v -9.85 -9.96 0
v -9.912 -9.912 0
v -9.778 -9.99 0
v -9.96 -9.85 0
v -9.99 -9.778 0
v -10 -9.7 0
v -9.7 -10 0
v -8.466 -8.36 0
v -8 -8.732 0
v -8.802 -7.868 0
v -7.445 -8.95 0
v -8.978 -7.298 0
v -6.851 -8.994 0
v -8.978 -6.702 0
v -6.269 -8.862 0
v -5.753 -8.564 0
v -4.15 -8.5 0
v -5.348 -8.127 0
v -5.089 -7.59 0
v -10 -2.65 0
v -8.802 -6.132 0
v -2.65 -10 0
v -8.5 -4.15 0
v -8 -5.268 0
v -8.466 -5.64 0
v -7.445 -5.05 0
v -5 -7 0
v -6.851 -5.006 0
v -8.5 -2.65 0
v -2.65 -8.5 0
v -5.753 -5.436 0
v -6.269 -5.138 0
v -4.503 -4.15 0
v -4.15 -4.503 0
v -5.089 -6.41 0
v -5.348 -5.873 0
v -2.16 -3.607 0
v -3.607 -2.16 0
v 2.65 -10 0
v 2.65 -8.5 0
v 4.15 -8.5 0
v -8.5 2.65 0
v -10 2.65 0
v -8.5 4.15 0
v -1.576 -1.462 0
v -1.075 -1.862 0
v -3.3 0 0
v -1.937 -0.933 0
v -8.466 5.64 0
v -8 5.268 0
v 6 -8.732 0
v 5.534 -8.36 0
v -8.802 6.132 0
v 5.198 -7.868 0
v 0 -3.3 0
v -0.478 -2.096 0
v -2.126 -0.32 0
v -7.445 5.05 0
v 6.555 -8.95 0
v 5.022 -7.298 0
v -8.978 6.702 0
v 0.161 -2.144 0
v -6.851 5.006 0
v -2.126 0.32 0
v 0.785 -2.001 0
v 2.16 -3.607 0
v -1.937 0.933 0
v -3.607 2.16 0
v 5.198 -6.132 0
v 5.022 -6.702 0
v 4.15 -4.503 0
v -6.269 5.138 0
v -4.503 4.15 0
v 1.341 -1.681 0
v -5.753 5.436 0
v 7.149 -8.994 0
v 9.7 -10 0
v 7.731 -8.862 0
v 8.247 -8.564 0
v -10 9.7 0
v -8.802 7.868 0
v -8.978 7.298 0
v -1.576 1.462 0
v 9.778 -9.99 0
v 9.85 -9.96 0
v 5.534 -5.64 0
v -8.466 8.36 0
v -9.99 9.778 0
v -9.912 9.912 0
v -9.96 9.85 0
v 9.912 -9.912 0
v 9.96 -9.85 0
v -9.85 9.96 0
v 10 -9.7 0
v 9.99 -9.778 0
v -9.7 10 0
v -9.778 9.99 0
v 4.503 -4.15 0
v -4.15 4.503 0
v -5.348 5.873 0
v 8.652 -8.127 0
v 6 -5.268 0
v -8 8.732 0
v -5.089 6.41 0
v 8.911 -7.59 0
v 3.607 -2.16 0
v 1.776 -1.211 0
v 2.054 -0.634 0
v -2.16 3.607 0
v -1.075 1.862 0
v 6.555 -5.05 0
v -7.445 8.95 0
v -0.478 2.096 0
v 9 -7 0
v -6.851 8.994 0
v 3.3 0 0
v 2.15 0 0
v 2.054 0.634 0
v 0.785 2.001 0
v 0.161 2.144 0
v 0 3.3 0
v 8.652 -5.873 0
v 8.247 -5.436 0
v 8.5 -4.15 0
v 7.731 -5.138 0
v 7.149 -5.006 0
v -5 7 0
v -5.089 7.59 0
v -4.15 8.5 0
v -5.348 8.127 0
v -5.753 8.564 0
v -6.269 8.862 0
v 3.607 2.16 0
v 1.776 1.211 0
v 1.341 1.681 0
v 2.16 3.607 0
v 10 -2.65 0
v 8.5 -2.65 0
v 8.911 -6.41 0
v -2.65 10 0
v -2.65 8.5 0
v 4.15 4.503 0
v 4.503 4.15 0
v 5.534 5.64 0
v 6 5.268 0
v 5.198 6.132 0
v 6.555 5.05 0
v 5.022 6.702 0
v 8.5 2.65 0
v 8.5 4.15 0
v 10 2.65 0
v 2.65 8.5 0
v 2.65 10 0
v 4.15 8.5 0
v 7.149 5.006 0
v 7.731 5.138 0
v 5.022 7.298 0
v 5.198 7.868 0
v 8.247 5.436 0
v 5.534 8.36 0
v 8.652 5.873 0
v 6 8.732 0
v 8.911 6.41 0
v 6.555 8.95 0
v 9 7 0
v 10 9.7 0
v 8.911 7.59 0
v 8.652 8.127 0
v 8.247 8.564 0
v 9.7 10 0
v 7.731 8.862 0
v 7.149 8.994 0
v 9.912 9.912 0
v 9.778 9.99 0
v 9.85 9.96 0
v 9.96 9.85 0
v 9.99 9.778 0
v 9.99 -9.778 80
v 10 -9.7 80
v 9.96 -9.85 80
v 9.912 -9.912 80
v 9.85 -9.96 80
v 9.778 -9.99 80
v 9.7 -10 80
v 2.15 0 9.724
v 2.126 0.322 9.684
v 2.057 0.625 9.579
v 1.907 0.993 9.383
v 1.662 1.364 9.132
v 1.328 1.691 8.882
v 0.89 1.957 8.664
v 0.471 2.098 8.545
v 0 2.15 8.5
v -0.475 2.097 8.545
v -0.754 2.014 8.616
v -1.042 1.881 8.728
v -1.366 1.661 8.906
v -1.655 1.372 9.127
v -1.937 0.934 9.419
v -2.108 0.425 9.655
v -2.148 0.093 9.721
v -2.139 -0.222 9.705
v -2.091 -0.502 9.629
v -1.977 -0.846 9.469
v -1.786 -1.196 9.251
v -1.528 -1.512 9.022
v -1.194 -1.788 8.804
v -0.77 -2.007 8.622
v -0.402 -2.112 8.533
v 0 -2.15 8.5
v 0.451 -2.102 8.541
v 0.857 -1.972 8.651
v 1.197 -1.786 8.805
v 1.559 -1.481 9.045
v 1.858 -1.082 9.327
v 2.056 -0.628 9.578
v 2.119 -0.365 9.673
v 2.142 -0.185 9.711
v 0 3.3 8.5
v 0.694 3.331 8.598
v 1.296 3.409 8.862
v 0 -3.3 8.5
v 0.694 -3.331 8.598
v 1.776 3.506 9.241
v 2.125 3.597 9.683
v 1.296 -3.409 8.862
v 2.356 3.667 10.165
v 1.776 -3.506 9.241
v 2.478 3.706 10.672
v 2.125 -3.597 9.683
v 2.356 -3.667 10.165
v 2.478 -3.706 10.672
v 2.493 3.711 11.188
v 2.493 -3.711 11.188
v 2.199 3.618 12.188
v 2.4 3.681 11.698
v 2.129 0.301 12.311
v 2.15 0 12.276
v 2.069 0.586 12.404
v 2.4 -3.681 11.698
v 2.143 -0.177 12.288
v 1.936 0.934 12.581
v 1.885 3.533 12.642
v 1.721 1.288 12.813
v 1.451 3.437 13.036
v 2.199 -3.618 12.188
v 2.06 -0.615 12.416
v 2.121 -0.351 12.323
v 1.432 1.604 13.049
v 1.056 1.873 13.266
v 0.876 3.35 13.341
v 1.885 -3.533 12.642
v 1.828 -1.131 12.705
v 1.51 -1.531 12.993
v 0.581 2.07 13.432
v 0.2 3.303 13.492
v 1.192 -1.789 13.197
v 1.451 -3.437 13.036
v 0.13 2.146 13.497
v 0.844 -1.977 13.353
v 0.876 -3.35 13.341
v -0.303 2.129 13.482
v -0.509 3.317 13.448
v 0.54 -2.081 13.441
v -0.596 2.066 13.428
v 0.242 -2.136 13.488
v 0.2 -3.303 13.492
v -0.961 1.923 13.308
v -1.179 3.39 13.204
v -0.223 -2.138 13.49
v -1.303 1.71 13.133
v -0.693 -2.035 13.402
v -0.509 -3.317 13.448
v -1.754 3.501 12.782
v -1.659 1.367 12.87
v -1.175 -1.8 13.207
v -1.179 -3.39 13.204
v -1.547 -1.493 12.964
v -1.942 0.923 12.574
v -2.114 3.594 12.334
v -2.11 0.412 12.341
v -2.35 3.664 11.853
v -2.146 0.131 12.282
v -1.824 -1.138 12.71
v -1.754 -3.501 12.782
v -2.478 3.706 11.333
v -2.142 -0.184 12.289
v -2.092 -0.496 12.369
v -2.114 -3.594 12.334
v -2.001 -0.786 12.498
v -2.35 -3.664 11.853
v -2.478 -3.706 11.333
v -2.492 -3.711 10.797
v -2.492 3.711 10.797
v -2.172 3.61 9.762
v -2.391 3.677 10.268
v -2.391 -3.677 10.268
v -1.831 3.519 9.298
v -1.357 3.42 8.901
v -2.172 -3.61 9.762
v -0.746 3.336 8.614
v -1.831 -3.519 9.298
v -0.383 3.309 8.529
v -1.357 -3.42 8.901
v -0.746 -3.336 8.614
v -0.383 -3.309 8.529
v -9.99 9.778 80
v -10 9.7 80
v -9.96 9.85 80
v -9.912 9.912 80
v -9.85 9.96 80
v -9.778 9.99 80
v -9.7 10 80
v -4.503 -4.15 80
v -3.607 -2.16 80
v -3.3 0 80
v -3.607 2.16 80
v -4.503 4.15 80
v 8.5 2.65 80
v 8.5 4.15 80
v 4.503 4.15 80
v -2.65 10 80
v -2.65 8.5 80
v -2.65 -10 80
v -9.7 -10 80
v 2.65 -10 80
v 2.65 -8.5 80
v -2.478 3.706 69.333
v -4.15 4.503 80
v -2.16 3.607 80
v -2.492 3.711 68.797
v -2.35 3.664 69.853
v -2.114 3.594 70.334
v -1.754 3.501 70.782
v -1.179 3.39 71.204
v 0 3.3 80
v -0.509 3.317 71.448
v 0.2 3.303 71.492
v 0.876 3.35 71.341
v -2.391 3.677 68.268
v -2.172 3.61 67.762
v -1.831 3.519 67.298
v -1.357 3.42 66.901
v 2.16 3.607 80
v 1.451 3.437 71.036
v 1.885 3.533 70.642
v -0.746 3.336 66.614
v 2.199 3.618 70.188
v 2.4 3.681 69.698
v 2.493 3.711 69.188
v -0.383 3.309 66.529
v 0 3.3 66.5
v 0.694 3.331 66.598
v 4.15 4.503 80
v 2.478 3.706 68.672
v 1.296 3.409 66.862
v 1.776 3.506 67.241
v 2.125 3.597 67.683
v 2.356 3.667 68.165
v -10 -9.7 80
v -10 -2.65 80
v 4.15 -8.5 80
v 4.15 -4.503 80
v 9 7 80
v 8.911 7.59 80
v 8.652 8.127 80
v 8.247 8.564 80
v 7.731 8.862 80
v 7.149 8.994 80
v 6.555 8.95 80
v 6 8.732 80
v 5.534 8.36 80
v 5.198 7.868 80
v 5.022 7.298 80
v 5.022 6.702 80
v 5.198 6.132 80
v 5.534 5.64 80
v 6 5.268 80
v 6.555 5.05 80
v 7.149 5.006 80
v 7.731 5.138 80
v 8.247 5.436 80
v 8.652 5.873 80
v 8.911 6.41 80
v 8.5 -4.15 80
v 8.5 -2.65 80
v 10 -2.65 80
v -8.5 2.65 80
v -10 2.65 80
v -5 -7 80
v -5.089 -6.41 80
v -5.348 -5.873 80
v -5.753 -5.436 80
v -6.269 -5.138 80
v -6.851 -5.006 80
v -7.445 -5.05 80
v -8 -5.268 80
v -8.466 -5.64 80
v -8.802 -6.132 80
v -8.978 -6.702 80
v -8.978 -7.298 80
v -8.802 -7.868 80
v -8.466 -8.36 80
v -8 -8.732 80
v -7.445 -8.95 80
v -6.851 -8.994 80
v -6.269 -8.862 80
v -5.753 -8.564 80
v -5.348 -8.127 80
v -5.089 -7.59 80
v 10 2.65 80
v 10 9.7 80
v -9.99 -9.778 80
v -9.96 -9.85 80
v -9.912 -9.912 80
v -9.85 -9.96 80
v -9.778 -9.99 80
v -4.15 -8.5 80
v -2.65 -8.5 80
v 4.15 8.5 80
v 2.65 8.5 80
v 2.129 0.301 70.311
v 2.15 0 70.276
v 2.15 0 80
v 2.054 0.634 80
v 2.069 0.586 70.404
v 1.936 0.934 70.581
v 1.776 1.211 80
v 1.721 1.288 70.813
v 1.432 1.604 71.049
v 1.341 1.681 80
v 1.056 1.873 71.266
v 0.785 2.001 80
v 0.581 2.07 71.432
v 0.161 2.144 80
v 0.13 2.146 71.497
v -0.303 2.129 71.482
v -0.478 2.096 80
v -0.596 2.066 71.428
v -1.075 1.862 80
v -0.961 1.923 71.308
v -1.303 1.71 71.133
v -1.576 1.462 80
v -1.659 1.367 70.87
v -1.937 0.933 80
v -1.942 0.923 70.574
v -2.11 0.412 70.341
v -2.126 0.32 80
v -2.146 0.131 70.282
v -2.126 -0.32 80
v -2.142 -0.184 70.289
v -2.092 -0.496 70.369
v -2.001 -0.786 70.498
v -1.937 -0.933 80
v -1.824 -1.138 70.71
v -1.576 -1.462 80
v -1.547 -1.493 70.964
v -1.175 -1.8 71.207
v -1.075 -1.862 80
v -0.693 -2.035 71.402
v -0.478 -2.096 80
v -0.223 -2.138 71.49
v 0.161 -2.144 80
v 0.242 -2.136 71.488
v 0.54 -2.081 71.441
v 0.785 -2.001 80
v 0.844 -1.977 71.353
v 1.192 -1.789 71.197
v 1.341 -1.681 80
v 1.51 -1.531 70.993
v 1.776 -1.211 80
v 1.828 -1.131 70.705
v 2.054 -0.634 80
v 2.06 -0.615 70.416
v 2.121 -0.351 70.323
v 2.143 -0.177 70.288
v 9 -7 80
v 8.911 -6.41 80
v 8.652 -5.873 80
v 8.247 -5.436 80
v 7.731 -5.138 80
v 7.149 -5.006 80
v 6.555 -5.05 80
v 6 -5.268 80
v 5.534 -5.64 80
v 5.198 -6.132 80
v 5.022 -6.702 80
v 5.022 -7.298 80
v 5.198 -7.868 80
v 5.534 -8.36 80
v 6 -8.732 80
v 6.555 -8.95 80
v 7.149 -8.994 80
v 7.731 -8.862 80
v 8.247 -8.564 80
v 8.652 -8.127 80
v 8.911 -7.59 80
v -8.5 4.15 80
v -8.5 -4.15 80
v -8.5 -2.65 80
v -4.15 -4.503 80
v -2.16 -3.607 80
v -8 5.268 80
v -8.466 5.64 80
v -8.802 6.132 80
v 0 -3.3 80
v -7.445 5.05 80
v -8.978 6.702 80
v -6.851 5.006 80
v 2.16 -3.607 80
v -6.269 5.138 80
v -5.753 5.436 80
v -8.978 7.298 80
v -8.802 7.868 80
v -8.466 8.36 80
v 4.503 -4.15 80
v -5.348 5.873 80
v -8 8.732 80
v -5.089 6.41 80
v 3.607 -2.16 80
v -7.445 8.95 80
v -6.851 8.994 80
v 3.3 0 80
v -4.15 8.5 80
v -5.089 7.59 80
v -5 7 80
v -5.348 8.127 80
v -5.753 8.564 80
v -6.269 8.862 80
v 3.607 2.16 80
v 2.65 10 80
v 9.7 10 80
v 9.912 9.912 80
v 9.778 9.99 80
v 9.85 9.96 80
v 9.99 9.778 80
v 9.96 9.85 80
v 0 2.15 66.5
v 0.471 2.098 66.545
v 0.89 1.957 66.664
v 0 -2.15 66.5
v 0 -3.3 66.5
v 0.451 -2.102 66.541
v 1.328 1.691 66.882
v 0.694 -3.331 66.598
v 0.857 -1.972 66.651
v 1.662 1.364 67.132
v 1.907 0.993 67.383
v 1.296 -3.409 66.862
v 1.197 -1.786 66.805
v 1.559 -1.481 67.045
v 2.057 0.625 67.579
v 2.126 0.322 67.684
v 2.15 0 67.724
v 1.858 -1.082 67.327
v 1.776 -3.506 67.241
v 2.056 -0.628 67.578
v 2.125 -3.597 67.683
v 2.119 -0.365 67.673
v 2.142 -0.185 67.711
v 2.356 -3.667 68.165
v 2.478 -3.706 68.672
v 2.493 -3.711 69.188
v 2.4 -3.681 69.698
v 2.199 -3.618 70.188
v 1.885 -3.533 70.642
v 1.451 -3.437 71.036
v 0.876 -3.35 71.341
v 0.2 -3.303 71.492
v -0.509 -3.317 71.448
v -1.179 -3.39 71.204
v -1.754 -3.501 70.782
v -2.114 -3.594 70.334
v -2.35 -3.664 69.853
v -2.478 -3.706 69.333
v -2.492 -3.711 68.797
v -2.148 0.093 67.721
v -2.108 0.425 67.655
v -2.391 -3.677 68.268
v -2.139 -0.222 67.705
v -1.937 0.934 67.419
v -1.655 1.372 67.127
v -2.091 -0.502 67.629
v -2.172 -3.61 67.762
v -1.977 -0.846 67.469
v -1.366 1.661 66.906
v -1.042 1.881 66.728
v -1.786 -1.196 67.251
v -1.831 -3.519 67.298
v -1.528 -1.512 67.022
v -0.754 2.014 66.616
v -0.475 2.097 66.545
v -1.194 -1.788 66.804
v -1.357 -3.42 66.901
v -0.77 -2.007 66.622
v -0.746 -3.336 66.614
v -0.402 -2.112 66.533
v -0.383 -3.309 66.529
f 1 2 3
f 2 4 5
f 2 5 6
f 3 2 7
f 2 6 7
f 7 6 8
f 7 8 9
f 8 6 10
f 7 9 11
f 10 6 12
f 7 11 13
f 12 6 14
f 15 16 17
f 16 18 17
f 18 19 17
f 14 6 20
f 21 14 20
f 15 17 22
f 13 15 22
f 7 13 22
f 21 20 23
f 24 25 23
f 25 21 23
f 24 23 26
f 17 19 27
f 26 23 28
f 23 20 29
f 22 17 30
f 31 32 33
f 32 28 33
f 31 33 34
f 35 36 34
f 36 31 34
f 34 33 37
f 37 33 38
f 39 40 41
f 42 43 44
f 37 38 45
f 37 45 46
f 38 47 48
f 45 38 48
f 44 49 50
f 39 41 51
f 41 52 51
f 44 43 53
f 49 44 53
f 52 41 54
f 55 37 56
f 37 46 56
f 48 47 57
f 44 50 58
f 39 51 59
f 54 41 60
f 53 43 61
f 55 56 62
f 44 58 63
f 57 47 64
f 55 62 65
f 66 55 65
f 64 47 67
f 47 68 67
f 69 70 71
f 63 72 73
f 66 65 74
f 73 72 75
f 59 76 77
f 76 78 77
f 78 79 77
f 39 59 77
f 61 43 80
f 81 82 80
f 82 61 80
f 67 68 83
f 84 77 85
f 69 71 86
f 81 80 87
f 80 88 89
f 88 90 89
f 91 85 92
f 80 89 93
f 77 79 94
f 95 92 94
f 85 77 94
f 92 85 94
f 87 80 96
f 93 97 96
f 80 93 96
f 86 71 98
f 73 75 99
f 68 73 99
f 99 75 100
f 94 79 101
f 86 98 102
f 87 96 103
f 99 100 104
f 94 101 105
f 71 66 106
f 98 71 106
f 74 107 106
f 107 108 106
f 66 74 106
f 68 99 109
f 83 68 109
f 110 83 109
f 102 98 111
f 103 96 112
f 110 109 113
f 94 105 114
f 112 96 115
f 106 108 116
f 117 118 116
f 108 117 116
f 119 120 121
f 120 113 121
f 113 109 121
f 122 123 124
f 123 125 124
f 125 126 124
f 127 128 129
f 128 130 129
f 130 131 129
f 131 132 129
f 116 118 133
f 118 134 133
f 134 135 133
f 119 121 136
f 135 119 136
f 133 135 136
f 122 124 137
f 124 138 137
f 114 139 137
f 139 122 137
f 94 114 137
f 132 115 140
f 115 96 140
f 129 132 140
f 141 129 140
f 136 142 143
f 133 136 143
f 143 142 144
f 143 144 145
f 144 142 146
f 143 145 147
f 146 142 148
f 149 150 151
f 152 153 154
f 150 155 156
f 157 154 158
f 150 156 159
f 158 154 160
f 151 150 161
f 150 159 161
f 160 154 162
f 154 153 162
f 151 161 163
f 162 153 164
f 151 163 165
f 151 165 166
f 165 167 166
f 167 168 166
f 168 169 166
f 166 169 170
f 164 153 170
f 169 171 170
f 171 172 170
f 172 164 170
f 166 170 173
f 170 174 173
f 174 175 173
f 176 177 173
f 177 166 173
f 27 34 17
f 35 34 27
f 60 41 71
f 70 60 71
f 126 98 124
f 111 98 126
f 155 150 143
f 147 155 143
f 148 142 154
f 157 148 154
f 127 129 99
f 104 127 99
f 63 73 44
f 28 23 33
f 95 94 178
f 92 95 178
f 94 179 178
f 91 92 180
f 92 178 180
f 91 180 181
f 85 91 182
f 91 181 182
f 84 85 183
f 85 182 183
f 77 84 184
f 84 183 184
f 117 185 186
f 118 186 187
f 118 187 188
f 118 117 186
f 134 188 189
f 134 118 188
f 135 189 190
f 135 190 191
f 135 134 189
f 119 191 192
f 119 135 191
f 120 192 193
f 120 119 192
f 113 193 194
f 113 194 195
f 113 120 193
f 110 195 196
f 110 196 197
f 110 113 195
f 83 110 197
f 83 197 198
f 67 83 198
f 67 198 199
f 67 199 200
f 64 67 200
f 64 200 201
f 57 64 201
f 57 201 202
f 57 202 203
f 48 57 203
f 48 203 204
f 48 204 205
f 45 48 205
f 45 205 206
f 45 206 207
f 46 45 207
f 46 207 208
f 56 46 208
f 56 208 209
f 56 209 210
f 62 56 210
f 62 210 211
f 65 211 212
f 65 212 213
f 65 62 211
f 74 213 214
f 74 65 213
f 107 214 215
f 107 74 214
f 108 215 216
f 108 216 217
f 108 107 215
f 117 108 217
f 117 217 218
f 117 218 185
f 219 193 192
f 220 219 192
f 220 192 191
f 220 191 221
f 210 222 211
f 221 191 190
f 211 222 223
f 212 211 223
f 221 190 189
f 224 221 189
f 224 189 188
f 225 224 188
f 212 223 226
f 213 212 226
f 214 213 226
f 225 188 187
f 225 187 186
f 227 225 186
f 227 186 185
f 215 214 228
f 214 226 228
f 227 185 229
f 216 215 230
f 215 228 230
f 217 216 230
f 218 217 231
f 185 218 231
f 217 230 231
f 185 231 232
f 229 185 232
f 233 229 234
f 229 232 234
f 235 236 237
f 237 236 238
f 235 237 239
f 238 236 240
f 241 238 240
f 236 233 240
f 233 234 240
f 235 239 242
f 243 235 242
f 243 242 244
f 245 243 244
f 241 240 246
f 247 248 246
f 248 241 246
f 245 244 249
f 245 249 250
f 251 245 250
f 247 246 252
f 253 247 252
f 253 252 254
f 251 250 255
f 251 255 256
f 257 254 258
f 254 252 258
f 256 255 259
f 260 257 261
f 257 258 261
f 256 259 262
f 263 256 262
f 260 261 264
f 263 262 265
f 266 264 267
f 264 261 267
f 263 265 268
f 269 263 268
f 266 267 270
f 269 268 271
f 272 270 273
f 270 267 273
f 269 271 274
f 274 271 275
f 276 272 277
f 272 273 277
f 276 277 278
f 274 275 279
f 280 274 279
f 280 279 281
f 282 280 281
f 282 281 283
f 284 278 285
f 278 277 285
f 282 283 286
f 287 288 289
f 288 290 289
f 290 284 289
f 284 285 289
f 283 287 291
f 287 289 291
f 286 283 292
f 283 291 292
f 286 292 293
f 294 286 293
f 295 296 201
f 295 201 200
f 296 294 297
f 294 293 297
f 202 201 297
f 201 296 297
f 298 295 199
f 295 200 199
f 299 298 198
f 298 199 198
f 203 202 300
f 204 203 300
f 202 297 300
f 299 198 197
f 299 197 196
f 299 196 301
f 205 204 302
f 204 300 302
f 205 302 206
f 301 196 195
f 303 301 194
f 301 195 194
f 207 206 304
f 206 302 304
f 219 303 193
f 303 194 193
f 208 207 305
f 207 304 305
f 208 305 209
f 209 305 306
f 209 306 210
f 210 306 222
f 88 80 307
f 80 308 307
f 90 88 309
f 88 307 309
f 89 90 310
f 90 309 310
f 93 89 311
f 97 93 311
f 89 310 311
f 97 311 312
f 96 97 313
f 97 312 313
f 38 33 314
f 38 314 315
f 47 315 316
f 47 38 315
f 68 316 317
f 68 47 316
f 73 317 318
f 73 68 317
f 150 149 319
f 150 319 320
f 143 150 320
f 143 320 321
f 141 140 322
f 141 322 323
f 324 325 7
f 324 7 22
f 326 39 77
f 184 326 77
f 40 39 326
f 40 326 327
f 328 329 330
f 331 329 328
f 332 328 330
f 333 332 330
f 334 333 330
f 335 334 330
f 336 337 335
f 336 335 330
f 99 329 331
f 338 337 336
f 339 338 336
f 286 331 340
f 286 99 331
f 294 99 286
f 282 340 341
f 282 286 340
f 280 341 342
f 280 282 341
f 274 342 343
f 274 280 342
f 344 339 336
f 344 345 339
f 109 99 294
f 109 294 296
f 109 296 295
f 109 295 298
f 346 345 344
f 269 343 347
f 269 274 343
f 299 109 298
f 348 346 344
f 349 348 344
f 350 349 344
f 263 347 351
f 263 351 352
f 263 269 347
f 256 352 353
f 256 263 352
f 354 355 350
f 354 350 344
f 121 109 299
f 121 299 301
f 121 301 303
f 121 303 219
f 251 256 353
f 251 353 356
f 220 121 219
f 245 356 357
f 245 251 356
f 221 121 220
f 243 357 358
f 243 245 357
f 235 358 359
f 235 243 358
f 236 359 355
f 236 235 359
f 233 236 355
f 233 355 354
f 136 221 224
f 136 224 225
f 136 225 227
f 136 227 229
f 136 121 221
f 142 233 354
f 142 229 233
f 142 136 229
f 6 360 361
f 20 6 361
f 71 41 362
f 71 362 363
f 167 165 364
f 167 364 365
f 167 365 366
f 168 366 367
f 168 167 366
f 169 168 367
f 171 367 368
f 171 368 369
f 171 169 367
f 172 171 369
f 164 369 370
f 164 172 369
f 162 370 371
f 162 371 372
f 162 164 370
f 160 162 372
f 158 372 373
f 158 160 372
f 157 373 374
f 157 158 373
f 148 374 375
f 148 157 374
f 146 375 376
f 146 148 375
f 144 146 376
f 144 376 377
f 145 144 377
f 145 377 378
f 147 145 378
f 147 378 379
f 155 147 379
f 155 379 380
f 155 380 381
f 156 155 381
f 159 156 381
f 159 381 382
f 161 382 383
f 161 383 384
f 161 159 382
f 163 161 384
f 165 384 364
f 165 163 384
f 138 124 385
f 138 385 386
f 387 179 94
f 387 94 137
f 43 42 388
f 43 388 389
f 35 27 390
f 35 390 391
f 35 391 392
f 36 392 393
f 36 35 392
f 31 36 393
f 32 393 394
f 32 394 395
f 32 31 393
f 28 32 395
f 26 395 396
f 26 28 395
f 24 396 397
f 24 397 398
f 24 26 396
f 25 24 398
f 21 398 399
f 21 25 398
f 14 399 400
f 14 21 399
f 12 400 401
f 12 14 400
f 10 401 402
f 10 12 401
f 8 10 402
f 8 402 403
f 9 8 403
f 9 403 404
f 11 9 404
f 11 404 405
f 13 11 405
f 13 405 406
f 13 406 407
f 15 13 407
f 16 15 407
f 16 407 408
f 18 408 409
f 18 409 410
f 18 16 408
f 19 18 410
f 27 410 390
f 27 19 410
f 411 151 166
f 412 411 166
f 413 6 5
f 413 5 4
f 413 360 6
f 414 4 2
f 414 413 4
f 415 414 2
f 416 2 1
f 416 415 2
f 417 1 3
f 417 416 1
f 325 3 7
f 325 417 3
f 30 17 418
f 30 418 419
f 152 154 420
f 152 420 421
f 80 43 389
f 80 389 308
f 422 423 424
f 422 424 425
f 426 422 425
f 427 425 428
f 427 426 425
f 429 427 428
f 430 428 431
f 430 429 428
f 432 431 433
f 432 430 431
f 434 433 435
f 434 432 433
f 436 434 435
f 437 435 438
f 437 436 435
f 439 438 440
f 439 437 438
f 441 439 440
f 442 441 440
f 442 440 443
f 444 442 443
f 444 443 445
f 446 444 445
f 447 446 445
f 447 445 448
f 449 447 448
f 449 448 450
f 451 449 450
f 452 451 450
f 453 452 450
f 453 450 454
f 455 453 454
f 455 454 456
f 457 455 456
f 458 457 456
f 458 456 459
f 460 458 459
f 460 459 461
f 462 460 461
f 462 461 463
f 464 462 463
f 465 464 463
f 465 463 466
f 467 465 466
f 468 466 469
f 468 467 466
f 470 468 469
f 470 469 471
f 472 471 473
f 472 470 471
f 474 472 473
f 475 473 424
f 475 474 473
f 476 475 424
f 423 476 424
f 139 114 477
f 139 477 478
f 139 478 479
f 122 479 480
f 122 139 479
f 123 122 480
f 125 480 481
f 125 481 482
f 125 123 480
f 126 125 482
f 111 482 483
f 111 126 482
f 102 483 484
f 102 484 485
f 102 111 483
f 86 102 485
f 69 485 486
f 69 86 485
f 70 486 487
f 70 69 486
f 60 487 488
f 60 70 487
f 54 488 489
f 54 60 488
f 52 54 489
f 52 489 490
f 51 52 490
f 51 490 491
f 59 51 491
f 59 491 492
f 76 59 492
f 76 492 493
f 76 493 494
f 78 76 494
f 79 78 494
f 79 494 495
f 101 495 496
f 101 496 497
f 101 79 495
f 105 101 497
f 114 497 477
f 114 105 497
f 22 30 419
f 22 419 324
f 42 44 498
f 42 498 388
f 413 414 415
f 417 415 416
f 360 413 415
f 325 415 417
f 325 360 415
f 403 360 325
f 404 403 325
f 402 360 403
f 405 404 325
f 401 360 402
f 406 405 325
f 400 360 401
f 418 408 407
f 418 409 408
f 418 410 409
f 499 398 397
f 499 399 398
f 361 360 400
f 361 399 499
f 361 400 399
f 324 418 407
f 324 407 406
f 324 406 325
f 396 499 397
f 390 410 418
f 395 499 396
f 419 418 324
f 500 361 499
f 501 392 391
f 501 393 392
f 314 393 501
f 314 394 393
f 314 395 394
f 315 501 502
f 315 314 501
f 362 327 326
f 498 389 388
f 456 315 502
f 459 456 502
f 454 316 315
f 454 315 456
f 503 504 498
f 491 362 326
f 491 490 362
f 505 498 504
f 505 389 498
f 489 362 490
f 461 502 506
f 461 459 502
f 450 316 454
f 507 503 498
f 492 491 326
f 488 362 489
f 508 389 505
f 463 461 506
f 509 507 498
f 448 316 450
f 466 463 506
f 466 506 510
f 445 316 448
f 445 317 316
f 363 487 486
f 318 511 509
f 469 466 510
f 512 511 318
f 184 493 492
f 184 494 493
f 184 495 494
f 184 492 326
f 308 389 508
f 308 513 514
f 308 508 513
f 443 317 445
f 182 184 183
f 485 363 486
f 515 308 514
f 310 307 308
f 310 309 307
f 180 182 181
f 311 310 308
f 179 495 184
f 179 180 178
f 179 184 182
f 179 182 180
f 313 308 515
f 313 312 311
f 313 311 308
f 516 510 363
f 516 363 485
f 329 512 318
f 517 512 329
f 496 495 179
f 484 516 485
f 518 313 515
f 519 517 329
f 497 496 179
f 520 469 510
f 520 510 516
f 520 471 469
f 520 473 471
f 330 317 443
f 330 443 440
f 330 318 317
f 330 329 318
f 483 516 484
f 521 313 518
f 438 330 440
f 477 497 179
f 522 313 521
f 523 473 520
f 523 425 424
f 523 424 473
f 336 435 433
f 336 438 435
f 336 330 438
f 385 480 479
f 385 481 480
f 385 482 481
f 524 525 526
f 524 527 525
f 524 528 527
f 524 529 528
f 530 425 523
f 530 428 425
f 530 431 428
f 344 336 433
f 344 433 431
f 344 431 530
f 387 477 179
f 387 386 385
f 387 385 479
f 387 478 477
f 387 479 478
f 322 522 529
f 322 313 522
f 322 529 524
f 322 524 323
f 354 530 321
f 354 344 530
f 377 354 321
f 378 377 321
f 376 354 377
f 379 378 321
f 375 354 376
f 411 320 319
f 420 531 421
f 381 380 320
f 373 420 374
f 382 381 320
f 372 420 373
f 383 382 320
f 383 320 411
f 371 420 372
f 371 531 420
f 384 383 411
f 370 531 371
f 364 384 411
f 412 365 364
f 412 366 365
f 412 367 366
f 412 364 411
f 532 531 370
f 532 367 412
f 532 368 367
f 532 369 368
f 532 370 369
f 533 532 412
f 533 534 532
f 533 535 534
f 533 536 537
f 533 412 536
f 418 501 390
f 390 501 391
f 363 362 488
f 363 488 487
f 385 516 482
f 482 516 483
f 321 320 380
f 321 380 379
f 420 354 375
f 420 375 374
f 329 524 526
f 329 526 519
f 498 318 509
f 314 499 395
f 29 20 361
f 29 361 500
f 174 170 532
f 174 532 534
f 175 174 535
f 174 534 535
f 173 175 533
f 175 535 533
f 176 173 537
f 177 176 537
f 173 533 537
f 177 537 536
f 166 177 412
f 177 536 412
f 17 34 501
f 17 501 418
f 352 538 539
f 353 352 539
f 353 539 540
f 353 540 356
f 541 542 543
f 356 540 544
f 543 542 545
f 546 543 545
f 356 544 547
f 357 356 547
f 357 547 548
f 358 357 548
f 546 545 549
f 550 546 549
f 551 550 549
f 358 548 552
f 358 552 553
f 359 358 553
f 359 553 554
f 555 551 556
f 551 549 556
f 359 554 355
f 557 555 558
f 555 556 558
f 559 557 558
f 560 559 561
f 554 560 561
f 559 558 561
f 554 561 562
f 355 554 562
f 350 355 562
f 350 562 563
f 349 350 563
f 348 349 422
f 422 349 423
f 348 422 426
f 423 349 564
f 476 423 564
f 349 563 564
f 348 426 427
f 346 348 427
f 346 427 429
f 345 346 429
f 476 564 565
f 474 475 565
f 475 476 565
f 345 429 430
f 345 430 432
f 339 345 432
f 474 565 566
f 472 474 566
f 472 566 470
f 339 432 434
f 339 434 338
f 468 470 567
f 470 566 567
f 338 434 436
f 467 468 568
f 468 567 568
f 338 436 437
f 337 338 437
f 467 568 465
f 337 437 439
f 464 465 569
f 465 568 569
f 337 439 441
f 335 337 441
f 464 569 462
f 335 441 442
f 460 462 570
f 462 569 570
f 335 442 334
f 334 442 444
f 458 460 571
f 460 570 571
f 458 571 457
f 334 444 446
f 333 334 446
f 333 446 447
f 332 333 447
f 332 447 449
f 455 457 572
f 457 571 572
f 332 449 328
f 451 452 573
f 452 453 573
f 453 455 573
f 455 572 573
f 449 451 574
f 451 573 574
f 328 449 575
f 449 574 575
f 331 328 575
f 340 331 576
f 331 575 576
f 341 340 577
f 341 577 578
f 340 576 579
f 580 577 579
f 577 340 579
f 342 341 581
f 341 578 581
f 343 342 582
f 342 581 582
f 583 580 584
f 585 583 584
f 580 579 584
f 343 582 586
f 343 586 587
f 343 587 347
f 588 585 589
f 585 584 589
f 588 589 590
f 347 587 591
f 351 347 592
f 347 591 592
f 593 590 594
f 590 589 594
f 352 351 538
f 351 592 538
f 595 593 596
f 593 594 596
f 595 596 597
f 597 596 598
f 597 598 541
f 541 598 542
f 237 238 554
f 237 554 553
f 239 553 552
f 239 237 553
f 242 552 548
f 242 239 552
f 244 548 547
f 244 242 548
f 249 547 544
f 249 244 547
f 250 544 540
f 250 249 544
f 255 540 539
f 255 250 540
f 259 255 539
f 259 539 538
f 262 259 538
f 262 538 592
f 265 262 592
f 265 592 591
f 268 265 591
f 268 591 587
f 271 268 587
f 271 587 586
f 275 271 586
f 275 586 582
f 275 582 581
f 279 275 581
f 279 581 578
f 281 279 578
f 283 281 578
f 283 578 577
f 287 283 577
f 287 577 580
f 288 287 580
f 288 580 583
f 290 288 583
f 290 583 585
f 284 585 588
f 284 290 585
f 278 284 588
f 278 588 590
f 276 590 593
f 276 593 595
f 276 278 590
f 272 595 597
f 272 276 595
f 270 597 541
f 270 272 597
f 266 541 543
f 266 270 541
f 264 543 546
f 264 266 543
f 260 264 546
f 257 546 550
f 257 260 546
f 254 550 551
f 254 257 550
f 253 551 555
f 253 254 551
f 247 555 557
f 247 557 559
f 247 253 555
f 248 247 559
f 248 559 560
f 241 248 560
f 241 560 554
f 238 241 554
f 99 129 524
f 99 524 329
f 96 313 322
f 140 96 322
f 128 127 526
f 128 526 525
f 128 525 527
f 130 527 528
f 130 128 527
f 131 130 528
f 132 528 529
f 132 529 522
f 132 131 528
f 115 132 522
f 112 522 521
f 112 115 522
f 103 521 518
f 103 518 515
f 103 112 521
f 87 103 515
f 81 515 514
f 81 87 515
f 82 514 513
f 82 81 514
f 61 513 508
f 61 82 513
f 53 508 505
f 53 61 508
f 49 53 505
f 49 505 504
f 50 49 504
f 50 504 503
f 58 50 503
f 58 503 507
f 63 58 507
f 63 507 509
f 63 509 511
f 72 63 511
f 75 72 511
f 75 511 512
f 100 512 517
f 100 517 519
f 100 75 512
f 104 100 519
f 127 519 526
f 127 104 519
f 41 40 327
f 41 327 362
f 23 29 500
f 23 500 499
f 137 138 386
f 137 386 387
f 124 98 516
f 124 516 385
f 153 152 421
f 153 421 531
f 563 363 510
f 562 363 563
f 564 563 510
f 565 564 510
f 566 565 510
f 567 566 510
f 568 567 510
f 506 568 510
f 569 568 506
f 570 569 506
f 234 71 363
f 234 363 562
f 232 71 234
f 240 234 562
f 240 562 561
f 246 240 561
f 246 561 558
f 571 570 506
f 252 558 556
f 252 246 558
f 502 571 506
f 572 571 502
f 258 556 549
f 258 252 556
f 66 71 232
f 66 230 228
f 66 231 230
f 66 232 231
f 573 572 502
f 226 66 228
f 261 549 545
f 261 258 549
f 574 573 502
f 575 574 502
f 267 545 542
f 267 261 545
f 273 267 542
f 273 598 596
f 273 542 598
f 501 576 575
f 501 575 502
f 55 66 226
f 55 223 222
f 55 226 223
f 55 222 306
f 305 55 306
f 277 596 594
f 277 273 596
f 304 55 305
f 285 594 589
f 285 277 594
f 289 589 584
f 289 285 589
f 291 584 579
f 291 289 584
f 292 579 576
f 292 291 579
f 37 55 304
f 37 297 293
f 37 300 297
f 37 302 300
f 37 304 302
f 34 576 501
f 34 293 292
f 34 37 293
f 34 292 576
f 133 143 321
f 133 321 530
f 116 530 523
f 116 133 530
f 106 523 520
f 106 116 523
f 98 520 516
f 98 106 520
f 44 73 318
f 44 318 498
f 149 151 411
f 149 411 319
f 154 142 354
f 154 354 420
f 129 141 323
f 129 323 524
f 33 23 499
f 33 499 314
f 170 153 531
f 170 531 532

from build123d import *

# Parameters (mm, degrees)
SKETCH_1_W               = 20
SKETCH_1_H               = 20
SKETCH_1_R               = 2
SKETCH_1_R_2             = 2.15
EXTRUDE_1_DEPTH          = 80
CUT_EXTRUDE_1_REACH      = 83.24
PATTERN_CIRCULAR_1_COUNT = 4
FILLET_1_R               = 0.3
SKETCH_3_R               = 2.5
CUT_EXTRUDE_2_DEPTH      = 84.066238629


with BuildPart() as part:
    # 스케치1 → 보스-돌출1 (new body)
    with BuildSketch(Plane.XY):
        Rectangle(SKETCH_1_W, SKETCH_1_H)
        with Locations((-7, -7)):
            Circle(SKETCH_1_R, mode=Mode.SUBTRACT)
        with Locations((7, -7)):
            Circle(SKETCH_1_R, mode=Mode.SUBTRACT)
        with Locations((-7, 7)):
            Circle(SKETCH_1_R, mode=Mode.SUBTRACT)
        Circle(SKETCH_1_R_2, mode=Mode.SUBTRACT)
        with Locations((7, 7)):
            Circle(SKETCH_1_R, mode=Mode.SUBTRACT)
    extrude(amount=EXTRUDE_1_DEPTH)

    # 스케치1<3> → 컷-돌출1 (cut, up to next)
    with BuildSketch(Plane.XY, mode=Mode.PRIVATE) as cut_extrude_1_sk1:
        with BuildLine():
            Line((-8.5, 2.65), (-10, 2.65))
            Line((-10, 2.65), (-10, -2.65))
            Line((-10, -2.65), (-8.5, -2.65))
            Line((-8.5, -2.65), (-8.5, -4.15))
            Line((-8.5, -4.15), (-4.503166667, -4.15))
            ThreePointArc((-4.503166667, -4.15), (-3.3, 0), (-4.503166667, 4.15))
            Line((-4.503166667, 4.15), (-8.5, 4.15))
            Line((-8.5, 4.15), (-8.5, 2.65))
        make_face()
    cut_extrude_1_tool1 = extrude(cut_extrude_1_sk1.sketch, amount=CUT_EXTRUDE_1_REACH, mode=Mode.PRIVATE) & part.part
    cut_extrude_1 = cut_extrude_1_tool1.solids().sort_by_distance((-6.606913, 0, 0))[0]
    add(cut_extrude_1, mode=Mode.SUBTRACT)

    # 원형 패턴1: 컷-돌출1 ×4 about axis
    pattern_circular_1_axis = Axis((0, 0, 80), (0, 0, -1))
    for i in range(1, PATTERN_CIRCULAR_1_COUNT):
        add(cut_extrude_1.rotate(pattern_circular_1_axis, i * 360 / PATTERN_CIRCULAR_1_COUNT), mode=Mode.SUBTRACT)

    # 필렛1
    fillet_1_edges = [part.edges().sort_by_distance(p)[0] for p in [
        (10, -10, 40),
        (-10, -10, 40),
        (-10, 10, 40),
        (10, 10, 40),
    ]]
    fillet(fillet_1_edges, radius=FILLET_1_R)

    # 스케치3 → 컷-돌출2 (cut, through all)
    with BuildSketch(Plane.XZ.offset(10)):
        with Locations((0, 69)):
            Circle(SKETCH_3_R)
        with Locations((0, 11)):
            Circle(SKETCH_3_R)
    extrude(amount=-CUT_EXTRUDE_2_DEPTH, mode=Mode.SUBTRACT)


solid = part.part
